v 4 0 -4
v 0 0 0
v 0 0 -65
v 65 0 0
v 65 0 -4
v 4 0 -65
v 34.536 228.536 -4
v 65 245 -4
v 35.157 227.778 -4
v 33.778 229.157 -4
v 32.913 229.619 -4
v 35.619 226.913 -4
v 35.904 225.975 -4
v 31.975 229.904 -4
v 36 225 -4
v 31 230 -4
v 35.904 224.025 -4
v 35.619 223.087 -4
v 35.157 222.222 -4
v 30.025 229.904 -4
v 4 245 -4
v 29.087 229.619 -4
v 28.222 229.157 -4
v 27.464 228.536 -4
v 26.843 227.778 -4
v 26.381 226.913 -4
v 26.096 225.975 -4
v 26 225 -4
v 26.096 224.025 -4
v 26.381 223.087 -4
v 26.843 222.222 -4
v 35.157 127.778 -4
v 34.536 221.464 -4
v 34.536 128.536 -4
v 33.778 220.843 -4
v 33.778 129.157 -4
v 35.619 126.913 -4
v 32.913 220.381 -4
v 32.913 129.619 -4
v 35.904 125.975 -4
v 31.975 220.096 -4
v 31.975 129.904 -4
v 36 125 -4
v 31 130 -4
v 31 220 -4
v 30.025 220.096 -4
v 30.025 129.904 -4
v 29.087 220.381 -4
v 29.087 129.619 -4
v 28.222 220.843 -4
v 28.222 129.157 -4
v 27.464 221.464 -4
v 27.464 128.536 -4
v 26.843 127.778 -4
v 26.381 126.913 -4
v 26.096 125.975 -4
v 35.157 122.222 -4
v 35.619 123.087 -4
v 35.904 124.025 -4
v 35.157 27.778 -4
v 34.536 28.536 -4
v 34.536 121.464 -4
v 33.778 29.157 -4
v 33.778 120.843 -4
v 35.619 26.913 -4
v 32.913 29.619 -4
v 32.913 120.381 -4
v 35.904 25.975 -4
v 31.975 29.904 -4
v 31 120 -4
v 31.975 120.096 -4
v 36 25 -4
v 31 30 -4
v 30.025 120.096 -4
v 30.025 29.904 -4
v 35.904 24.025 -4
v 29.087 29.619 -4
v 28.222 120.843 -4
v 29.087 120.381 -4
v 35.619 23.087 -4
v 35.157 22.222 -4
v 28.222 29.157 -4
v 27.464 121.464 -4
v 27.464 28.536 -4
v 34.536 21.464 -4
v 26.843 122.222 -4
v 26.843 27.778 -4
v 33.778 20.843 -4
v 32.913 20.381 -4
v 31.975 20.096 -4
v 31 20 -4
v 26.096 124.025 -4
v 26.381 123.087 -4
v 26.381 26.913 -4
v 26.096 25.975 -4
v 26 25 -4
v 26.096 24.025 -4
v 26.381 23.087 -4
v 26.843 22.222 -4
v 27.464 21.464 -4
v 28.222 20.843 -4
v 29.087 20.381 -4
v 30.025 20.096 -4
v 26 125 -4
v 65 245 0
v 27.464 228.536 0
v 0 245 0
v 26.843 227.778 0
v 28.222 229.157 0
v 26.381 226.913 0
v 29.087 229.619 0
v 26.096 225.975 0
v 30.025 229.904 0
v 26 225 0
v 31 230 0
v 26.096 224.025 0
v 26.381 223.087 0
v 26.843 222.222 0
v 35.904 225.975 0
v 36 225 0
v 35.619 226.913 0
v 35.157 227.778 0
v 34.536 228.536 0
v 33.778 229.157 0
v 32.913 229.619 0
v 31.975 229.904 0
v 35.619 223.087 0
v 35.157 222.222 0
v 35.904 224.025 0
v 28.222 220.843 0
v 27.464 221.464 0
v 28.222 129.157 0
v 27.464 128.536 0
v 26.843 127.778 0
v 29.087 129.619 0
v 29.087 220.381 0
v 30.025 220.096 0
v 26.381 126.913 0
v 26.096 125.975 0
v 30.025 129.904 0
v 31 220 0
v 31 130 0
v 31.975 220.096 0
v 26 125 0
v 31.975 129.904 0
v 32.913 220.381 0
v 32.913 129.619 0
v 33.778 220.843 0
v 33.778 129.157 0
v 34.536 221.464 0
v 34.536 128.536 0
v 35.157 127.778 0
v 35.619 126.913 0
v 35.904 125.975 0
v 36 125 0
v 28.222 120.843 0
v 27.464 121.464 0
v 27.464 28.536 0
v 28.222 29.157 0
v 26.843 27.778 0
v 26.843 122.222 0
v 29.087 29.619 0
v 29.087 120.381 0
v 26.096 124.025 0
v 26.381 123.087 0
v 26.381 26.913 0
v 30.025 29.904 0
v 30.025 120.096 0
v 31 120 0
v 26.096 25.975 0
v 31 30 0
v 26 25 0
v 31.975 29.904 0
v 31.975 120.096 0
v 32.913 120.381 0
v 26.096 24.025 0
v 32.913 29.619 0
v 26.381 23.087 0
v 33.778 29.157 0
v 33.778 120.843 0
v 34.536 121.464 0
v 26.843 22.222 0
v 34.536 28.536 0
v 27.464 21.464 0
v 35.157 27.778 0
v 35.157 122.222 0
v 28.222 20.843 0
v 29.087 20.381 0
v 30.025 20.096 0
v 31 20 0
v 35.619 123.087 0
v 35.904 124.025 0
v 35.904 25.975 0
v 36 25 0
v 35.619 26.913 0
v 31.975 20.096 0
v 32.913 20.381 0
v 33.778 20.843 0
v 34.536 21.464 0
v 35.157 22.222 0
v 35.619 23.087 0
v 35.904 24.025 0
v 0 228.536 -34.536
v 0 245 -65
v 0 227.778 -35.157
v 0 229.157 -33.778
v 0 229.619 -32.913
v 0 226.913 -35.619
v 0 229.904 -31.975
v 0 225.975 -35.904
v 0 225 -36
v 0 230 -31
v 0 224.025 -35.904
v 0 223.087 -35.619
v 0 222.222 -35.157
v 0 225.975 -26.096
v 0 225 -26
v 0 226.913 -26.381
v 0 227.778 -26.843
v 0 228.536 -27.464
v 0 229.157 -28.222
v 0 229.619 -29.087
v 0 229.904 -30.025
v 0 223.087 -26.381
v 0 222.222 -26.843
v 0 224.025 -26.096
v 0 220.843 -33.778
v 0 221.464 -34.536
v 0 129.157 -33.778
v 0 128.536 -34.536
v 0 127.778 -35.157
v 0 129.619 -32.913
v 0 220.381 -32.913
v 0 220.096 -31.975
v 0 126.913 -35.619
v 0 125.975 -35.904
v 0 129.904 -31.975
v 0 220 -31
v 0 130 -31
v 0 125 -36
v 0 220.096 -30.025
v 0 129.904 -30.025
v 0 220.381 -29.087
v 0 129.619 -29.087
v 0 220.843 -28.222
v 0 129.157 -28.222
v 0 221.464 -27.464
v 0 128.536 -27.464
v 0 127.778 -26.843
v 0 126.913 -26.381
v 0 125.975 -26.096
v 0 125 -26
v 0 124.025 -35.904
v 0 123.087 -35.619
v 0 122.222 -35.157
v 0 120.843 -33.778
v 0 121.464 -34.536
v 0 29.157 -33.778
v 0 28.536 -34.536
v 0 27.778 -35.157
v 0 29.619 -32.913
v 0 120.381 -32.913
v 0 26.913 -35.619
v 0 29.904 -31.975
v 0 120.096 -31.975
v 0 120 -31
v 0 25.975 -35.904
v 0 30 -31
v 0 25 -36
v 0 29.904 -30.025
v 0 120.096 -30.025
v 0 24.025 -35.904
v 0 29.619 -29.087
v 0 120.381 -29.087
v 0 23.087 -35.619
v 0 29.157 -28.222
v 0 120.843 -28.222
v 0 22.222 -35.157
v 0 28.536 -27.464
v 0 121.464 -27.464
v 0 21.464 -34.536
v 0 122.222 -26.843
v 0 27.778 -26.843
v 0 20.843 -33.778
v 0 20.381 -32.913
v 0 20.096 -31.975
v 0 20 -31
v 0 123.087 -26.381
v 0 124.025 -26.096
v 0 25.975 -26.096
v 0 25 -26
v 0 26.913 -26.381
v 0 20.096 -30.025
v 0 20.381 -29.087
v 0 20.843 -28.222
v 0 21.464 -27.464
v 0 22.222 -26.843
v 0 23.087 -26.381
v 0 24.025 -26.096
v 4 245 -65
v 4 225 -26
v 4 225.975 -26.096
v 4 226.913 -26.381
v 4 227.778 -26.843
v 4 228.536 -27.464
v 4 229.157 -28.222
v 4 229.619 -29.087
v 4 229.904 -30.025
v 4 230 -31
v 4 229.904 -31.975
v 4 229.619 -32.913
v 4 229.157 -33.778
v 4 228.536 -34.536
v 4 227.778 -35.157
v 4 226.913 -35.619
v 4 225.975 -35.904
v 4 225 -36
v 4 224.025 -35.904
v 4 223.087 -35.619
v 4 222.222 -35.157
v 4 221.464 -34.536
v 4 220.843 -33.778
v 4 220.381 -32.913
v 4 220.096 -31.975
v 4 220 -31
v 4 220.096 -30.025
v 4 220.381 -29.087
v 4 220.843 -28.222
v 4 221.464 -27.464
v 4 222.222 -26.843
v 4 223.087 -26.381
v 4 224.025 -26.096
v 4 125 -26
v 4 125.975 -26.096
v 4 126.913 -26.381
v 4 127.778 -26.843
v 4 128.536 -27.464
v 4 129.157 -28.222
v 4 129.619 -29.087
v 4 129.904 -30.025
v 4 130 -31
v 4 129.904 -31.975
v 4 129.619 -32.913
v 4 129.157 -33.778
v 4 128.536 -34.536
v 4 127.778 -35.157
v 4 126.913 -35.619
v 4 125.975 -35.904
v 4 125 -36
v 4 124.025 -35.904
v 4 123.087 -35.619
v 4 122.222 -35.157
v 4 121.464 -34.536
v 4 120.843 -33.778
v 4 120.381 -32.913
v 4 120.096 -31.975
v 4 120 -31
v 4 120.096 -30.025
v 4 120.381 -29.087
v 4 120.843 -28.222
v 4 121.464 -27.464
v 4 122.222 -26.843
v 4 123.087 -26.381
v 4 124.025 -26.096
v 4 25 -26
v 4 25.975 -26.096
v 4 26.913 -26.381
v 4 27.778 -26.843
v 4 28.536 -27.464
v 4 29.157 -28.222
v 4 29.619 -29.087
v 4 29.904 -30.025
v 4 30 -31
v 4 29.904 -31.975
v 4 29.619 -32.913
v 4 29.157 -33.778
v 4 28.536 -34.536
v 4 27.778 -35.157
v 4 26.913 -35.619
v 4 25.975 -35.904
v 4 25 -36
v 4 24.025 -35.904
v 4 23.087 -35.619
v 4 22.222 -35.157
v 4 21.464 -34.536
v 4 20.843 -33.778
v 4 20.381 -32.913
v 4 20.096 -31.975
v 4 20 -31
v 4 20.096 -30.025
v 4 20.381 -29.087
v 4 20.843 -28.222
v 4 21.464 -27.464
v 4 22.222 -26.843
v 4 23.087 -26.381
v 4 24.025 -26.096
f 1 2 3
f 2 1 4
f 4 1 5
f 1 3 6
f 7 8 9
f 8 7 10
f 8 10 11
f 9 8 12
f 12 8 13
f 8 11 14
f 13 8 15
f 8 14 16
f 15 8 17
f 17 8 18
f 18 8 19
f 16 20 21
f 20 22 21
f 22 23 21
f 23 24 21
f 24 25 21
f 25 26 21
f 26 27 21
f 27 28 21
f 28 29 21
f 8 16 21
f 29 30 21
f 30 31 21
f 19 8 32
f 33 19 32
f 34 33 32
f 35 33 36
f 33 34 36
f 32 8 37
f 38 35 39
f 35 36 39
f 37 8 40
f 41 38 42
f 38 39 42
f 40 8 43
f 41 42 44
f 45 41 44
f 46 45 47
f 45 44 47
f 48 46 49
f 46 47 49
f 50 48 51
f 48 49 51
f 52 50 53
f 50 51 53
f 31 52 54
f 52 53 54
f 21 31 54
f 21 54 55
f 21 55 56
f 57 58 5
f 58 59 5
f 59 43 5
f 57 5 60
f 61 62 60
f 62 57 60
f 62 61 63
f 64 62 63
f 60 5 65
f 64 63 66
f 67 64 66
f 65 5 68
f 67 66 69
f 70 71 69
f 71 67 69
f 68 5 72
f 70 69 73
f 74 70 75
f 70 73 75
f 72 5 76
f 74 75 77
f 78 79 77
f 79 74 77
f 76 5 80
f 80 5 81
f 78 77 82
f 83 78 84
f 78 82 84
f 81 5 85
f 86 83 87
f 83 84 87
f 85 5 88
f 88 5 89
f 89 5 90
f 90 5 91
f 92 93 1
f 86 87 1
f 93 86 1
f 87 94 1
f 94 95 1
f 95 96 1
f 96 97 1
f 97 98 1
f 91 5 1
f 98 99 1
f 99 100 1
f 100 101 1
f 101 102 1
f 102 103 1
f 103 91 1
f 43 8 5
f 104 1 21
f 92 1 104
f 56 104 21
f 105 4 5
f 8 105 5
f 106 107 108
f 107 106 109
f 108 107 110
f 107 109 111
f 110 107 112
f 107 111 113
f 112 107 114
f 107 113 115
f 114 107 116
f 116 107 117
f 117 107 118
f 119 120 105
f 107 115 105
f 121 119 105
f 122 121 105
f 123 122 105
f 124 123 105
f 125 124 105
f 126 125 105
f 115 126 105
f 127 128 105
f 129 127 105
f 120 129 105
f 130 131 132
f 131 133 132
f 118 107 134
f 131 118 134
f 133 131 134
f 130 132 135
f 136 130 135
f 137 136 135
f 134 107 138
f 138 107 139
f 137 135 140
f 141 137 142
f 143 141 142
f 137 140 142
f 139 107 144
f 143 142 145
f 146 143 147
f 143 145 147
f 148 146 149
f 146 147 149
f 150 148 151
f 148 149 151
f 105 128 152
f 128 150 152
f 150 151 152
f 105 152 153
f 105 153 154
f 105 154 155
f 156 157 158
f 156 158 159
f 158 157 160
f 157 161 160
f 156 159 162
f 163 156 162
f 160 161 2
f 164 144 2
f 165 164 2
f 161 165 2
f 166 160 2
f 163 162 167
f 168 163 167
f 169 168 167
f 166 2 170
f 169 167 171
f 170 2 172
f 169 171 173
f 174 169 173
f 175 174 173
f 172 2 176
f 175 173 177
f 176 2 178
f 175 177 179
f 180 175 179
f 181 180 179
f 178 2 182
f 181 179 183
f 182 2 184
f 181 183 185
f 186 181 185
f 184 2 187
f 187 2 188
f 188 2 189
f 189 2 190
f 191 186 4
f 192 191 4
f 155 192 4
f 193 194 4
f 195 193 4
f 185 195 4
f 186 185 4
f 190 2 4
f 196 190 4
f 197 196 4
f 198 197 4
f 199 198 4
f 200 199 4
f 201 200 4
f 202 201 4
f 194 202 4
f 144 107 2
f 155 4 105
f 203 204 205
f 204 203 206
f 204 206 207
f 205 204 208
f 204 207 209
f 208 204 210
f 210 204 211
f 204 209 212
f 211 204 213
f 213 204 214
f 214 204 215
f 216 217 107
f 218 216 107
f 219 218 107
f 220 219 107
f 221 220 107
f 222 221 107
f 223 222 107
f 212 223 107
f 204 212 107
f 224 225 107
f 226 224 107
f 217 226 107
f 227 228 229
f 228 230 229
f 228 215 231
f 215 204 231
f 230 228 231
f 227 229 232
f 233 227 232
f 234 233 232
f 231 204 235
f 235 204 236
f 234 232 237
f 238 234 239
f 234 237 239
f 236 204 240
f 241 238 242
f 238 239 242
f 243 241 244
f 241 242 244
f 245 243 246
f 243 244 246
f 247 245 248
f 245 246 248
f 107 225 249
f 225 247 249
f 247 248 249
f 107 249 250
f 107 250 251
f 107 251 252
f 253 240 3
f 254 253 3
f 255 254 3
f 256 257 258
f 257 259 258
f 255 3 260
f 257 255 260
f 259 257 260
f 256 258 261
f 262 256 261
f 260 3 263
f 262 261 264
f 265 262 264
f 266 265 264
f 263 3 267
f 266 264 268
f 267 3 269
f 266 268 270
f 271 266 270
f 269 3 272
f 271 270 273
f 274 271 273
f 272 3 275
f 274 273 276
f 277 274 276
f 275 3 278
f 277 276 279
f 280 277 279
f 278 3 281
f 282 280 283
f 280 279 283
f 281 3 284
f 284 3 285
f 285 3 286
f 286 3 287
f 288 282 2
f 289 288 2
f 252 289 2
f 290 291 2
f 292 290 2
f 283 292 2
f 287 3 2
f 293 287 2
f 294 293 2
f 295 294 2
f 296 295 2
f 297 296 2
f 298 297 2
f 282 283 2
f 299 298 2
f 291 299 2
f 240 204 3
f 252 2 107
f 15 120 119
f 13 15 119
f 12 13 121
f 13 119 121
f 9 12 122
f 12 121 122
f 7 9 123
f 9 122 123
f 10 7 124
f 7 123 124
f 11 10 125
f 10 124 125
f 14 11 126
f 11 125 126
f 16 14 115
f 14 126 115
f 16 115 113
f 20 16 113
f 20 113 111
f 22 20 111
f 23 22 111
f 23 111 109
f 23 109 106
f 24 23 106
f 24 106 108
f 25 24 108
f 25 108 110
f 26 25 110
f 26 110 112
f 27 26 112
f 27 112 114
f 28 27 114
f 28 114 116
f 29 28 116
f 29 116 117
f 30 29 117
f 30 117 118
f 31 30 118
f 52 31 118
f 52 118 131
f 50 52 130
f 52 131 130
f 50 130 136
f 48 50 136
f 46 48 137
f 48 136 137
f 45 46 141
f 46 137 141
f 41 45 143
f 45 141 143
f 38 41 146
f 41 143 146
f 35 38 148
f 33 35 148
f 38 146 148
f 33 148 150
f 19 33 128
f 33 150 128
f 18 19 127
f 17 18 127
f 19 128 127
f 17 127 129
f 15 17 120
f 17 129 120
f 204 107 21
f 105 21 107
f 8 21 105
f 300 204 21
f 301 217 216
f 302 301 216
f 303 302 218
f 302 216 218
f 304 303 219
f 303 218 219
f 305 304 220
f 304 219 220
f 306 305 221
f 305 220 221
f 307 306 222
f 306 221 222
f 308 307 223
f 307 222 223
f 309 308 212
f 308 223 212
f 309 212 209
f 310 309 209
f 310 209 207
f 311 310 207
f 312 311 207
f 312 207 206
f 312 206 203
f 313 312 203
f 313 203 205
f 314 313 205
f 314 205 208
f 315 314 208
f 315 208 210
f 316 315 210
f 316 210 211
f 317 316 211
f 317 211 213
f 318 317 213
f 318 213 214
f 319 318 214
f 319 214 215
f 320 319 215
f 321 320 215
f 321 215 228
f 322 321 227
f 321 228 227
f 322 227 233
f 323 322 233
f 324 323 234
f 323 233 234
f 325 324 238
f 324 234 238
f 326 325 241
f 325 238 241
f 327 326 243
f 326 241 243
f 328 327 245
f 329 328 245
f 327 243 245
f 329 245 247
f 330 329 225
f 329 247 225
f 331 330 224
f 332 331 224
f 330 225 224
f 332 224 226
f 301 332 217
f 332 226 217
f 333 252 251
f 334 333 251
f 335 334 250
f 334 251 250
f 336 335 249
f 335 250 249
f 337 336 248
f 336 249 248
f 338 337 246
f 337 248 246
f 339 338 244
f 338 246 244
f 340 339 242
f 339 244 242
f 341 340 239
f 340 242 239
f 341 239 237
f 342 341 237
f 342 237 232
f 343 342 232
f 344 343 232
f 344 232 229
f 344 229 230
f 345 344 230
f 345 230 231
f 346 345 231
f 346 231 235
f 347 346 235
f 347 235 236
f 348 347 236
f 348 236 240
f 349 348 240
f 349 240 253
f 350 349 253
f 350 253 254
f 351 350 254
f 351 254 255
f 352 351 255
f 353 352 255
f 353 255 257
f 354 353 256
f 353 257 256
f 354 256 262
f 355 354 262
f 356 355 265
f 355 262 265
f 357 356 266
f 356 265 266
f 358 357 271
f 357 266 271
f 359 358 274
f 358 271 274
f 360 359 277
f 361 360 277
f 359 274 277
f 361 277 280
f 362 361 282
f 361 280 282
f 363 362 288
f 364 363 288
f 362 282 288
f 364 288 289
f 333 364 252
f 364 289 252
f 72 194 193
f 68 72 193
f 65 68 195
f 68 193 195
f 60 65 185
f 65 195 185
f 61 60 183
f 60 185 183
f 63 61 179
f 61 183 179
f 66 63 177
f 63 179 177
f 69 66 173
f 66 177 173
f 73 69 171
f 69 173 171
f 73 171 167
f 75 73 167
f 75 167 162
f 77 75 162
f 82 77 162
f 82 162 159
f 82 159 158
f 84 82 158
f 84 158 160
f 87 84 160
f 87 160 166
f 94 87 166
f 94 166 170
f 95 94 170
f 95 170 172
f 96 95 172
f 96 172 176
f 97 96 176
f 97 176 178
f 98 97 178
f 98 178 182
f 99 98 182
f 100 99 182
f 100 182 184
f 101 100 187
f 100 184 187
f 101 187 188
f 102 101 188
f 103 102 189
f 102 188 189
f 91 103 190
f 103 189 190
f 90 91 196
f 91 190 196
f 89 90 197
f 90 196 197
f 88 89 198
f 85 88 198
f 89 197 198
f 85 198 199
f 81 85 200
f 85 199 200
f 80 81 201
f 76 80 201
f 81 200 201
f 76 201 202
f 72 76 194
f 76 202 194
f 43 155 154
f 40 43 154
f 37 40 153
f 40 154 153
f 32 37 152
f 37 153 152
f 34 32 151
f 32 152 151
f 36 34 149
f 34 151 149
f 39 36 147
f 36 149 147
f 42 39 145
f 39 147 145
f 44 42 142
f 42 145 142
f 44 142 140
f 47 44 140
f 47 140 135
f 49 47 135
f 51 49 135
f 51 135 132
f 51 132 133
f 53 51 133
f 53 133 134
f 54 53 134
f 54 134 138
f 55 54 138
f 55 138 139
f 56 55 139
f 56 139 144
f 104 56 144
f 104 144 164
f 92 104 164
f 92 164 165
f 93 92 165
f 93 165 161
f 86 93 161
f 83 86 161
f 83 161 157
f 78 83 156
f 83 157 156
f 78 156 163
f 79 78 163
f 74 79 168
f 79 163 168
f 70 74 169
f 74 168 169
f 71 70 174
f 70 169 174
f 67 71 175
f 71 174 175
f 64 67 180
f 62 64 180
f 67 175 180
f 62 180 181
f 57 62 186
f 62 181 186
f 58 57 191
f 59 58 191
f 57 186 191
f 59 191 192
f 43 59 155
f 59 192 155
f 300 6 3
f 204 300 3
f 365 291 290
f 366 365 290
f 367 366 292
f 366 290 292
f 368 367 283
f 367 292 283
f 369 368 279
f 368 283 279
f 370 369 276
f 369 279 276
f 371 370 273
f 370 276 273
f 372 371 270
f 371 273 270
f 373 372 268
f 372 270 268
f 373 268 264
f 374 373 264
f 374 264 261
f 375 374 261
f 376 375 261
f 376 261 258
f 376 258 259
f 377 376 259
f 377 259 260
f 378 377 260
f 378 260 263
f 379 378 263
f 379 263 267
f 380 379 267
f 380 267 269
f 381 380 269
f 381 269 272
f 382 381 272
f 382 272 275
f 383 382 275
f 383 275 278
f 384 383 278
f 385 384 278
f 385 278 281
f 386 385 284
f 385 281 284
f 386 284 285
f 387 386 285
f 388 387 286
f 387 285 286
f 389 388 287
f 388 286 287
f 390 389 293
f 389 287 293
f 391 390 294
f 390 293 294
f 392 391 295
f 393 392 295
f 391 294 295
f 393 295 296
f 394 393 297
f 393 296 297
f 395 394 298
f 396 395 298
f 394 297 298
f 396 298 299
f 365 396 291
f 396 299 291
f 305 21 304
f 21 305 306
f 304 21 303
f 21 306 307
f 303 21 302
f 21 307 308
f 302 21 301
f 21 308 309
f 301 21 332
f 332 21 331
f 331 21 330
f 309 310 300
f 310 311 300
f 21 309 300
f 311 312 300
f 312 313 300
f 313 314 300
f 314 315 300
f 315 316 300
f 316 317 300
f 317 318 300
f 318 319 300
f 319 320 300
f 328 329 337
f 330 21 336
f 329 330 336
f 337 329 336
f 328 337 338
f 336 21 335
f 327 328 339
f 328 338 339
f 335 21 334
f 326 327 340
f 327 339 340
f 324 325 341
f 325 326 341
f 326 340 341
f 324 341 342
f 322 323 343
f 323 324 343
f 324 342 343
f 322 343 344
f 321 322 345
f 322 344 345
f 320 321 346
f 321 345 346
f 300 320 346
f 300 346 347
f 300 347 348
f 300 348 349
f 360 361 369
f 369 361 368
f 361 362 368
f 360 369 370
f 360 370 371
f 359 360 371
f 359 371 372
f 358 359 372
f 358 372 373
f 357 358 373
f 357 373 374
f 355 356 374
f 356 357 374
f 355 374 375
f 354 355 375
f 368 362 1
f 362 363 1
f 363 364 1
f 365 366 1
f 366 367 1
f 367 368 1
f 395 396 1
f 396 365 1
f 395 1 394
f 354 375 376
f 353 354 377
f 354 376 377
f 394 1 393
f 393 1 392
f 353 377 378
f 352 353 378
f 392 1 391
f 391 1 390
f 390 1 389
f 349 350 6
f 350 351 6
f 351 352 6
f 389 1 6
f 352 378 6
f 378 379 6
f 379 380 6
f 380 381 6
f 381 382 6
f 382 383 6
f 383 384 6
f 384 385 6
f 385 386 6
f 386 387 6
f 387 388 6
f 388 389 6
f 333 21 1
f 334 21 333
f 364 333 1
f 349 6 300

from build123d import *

# Parameters (mm, degrees)
EXTRUDE_1_DEPTH     = 245
SKETCH_2_R          = 5
CUT_EXTRUDE_1_DEPTH = 10
SKETCH_3_R          = 5
CUT_EXTRUDE_2_DEPTH = 10


with BuildPart() as part:
    # Эскиз1 → Вытянуть-Тонкостенный1 (new body)
    with BuildSketch(Plane(origin=(0, 0, 0), x_dir=(1, 0, 0), z_dir=(0, 1, 0))):
        Polygon((0, 65), (0, 0), (65, 0), (65, 4), (4, 4), (4, 65), align=None)
    extrude(amount=EXTRUDE_1_DEPTH)

    # Эскиз2 → Вырез-Вытянуть1 (cut)
    with BuildSketch(Plane.XY):
        with Locations((31, 225)):
            Circle(SKETCH_2_R)
        with Locations((31, 125)):
            Circle(SKETCH_2_R)
        with Locations((31, 25)):
            Circle(SKETCH_2_R)
    extrude(amount=-CUT_EXTRUDE_1_DEPTH, mode=Mode.SUBTRACT)

    # Эскиз3 → Вырез-Вытянуть2 (cut)
    with BuildSketch(Plane.ZY):
        with Locations((-31, 225)):
            Circle(SKETCH_3_R)
        with Locations((-31, 125)):
            Circle(SKETCH_3_R)
        with Locations((-31, 25)):
            Circle(SKETCH_3_R)
    extrude(amount=-CUT_EXTRUDE_2_DEPTH, mode=Mode.SUBTRACT)


solid = part.part
